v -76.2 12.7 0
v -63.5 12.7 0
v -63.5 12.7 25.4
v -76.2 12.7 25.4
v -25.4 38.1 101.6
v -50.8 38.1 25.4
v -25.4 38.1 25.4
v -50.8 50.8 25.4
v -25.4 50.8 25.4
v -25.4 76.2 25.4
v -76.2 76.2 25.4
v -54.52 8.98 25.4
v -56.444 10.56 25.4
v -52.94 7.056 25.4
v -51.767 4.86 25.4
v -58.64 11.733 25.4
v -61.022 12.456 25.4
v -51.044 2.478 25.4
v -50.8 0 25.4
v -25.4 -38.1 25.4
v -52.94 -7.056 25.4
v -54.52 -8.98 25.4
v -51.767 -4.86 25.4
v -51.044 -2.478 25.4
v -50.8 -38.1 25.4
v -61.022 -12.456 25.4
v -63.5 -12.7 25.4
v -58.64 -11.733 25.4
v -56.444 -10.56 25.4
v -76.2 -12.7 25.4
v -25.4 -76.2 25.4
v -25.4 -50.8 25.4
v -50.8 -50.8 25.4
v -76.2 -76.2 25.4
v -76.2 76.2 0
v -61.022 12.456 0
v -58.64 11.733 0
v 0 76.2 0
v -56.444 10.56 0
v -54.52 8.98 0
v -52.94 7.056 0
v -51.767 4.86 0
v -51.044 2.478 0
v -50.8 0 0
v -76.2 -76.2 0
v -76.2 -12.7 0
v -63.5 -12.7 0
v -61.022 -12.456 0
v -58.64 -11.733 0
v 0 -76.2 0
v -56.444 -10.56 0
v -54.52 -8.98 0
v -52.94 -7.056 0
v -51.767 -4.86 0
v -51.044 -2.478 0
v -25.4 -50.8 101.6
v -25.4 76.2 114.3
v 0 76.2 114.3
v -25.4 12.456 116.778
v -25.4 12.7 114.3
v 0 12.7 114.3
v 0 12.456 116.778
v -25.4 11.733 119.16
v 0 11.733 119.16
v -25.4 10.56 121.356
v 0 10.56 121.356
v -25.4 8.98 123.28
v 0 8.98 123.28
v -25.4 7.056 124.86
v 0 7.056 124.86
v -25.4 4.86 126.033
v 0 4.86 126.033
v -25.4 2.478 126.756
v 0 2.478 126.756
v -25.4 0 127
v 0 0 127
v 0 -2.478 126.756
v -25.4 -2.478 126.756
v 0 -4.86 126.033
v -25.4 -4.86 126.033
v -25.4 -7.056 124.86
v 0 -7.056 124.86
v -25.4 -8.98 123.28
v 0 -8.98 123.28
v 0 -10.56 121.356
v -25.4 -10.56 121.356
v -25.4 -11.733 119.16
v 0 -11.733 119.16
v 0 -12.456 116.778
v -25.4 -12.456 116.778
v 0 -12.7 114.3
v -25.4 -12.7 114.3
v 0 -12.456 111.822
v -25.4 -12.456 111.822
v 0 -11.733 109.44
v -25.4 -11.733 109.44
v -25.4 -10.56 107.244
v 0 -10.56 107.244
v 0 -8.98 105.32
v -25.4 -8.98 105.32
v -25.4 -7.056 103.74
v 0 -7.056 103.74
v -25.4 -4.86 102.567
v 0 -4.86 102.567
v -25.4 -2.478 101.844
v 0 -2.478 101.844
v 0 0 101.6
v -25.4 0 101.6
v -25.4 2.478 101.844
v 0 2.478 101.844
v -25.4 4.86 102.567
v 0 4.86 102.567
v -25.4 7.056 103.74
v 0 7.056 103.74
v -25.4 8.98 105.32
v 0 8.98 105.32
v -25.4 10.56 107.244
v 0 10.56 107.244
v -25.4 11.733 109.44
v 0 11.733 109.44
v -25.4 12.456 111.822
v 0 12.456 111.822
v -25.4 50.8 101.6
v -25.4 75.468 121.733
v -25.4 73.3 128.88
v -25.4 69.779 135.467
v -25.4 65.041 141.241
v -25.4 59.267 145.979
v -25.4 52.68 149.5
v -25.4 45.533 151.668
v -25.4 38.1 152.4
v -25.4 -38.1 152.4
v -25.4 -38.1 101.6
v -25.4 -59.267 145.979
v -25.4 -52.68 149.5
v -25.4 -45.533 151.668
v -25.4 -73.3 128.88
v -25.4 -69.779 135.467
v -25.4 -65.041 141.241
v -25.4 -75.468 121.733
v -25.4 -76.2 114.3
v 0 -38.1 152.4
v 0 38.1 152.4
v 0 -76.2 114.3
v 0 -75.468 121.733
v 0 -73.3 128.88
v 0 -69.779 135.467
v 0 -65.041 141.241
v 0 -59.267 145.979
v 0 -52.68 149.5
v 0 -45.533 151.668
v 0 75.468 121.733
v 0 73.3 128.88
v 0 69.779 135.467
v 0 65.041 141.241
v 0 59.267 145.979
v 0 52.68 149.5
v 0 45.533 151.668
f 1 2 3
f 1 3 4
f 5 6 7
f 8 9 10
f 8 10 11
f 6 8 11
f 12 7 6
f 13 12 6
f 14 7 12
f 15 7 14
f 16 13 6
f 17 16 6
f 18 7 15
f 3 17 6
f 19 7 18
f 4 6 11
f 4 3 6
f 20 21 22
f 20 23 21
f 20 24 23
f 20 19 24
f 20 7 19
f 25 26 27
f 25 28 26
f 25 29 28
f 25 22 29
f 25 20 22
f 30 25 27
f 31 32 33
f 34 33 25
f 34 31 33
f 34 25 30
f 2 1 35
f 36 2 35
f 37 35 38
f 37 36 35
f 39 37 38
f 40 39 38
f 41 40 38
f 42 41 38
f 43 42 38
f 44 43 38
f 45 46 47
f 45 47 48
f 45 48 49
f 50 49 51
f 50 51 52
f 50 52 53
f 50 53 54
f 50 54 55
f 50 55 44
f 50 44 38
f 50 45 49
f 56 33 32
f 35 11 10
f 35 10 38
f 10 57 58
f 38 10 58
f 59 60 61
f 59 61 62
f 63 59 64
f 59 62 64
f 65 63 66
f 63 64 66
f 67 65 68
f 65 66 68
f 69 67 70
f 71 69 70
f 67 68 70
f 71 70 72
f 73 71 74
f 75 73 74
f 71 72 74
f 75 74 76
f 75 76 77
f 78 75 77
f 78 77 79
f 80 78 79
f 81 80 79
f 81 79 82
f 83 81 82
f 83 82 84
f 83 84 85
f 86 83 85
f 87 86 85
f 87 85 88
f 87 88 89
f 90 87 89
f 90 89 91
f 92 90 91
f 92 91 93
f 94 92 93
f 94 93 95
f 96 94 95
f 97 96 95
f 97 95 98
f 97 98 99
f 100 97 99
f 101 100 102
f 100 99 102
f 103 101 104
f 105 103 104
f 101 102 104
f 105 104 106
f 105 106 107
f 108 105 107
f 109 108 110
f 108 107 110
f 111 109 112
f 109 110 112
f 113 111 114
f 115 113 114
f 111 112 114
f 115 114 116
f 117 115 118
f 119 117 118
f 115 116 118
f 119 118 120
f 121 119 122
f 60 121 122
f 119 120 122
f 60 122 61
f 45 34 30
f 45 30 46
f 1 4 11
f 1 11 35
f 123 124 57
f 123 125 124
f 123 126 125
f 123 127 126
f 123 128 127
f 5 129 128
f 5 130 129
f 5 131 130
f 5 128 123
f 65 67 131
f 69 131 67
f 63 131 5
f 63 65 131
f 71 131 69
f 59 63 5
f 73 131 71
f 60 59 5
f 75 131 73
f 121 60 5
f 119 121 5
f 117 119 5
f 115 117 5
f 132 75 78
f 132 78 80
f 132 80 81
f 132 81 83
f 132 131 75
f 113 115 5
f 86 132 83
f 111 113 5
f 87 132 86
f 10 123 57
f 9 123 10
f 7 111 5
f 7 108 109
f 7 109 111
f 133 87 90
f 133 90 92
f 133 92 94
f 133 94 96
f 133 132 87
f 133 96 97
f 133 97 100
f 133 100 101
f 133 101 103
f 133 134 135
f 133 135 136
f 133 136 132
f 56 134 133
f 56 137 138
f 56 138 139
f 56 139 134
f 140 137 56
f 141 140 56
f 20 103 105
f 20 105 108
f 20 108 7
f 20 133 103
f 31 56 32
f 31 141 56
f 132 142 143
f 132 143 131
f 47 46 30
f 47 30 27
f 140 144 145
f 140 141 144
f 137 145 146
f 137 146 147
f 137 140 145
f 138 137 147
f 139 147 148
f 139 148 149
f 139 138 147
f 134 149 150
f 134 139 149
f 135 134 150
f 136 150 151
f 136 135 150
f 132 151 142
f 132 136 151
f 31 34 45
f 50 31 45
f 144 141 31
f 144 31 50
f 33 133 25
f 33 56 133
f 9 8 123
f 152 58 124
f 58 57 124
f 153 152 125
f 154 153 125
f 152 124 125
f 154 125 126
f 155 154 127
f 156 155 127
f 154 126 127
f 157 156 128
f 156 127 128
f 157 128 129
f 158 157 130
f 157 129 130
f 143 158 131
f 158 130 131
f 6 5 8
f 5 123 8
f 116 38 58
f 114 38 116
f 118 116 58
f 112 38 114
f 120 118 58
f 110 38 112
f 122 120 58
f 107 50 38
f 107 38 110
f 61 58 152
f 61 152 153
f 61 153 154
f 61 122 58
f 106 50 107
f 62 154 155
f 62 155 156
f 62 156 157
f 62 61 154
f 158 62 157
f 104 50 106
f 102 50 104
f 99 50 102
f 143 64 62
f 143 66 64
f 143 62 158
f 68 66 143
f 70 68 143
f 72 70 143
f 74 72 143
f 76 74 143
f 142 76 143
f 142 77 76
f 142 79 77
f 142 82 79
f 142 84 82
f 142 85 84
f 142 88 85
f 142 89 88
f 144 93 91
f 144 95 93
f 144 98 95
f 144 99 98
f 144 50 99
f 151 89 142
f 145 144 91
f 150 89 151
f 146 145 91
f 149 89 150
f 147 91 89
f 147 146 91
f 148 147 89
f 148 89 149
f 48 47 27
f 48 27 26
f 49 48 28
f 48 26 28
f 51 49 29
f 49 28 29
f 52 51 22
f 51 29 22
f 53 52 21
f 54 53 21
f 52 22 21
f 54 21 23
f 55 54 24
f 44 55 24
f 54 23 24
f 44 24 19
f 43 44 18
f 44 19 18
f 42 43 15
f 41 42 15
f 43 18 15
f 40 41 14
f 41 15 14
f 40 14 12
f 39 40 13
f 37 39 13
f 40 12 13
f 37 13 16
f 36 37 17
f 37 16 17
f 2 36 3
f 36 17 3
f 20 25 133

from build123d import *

# Parameters (mm, degrees)
F1_DEPTH = 76.2
F2_R     = 12.7
F3_DEPTH = 76.201
F5_DEPTH = 25.401
F6_R     = 38.1
F9_DEPTH = 6.35


# Not quite as in the source:
# - a pattern or mirror of a feature is missing from the dataset's text; its kind, count and spacing are read off the source's solid


with BuildPart() as f1:
    # F0 (on Front) → F1 (new body, symmetric)
    with BuildSketch(Plane.XZ):
        Polygon((-76.2, 0), (0, 0), (0, 152.4), (-25.4, 152.4), (-25.4, 25.4), (-76.2, 25.4), align=None)
    extrude(amount=F1_DEPTH, both=True)

    # F2 (on Right) → F3 (cut, through all)
    with BuildSketch(Plane.YZ):
        with Locations((0, 114.3)):
            Circle(F2_R)
    extrude(amount=-F3_DEPTH, mode=Mode.SUBTRACT)

    # F4 (on face) → F5 (cut, through all)
    with BuildSketch(Plane.XY.offset(25.4)):
        with BuildLine():
            Line((-76.2, 12.7), (-76.2, 0))
            Line((-76.2, 0), (-76.2, -12.7))
            Line((-76.2, -12.7), (-63.5, -12.7))
            ThreePointArc((-63.5, -12.7), (-50.8, 0), (-63.5, 12.7))
            Line((-63.5, 12.7), (-76.2, 12.7))
        make_face()
    extrude(amount=-F5_DEPTH, mode=Mode.SUBTRACT)

    # F6
    f6_edges = [f1.edges().sort_by_distance(p)[0] for p in [
        (-12.7, -76.2, 152.4),
        (-12.7, 76.2, 152.4),
    ]]
    fillet(f6_edges, radius=F6_R)

    # F8 (on offset) → F9 (join, symmetric)
    with BuildSketch(Plane.XZ.offset(44.45)):
        Polygon((-50.8, 25.4), (-25.4, 25.4), (-25.4, 101.6), align=None)
    f9 = extrude(amount=F9_DEPTH, both=True)

    # F9_copies: F9 across plane
    add(f9.mirror(Plane.ZX))


solid = f1.part
